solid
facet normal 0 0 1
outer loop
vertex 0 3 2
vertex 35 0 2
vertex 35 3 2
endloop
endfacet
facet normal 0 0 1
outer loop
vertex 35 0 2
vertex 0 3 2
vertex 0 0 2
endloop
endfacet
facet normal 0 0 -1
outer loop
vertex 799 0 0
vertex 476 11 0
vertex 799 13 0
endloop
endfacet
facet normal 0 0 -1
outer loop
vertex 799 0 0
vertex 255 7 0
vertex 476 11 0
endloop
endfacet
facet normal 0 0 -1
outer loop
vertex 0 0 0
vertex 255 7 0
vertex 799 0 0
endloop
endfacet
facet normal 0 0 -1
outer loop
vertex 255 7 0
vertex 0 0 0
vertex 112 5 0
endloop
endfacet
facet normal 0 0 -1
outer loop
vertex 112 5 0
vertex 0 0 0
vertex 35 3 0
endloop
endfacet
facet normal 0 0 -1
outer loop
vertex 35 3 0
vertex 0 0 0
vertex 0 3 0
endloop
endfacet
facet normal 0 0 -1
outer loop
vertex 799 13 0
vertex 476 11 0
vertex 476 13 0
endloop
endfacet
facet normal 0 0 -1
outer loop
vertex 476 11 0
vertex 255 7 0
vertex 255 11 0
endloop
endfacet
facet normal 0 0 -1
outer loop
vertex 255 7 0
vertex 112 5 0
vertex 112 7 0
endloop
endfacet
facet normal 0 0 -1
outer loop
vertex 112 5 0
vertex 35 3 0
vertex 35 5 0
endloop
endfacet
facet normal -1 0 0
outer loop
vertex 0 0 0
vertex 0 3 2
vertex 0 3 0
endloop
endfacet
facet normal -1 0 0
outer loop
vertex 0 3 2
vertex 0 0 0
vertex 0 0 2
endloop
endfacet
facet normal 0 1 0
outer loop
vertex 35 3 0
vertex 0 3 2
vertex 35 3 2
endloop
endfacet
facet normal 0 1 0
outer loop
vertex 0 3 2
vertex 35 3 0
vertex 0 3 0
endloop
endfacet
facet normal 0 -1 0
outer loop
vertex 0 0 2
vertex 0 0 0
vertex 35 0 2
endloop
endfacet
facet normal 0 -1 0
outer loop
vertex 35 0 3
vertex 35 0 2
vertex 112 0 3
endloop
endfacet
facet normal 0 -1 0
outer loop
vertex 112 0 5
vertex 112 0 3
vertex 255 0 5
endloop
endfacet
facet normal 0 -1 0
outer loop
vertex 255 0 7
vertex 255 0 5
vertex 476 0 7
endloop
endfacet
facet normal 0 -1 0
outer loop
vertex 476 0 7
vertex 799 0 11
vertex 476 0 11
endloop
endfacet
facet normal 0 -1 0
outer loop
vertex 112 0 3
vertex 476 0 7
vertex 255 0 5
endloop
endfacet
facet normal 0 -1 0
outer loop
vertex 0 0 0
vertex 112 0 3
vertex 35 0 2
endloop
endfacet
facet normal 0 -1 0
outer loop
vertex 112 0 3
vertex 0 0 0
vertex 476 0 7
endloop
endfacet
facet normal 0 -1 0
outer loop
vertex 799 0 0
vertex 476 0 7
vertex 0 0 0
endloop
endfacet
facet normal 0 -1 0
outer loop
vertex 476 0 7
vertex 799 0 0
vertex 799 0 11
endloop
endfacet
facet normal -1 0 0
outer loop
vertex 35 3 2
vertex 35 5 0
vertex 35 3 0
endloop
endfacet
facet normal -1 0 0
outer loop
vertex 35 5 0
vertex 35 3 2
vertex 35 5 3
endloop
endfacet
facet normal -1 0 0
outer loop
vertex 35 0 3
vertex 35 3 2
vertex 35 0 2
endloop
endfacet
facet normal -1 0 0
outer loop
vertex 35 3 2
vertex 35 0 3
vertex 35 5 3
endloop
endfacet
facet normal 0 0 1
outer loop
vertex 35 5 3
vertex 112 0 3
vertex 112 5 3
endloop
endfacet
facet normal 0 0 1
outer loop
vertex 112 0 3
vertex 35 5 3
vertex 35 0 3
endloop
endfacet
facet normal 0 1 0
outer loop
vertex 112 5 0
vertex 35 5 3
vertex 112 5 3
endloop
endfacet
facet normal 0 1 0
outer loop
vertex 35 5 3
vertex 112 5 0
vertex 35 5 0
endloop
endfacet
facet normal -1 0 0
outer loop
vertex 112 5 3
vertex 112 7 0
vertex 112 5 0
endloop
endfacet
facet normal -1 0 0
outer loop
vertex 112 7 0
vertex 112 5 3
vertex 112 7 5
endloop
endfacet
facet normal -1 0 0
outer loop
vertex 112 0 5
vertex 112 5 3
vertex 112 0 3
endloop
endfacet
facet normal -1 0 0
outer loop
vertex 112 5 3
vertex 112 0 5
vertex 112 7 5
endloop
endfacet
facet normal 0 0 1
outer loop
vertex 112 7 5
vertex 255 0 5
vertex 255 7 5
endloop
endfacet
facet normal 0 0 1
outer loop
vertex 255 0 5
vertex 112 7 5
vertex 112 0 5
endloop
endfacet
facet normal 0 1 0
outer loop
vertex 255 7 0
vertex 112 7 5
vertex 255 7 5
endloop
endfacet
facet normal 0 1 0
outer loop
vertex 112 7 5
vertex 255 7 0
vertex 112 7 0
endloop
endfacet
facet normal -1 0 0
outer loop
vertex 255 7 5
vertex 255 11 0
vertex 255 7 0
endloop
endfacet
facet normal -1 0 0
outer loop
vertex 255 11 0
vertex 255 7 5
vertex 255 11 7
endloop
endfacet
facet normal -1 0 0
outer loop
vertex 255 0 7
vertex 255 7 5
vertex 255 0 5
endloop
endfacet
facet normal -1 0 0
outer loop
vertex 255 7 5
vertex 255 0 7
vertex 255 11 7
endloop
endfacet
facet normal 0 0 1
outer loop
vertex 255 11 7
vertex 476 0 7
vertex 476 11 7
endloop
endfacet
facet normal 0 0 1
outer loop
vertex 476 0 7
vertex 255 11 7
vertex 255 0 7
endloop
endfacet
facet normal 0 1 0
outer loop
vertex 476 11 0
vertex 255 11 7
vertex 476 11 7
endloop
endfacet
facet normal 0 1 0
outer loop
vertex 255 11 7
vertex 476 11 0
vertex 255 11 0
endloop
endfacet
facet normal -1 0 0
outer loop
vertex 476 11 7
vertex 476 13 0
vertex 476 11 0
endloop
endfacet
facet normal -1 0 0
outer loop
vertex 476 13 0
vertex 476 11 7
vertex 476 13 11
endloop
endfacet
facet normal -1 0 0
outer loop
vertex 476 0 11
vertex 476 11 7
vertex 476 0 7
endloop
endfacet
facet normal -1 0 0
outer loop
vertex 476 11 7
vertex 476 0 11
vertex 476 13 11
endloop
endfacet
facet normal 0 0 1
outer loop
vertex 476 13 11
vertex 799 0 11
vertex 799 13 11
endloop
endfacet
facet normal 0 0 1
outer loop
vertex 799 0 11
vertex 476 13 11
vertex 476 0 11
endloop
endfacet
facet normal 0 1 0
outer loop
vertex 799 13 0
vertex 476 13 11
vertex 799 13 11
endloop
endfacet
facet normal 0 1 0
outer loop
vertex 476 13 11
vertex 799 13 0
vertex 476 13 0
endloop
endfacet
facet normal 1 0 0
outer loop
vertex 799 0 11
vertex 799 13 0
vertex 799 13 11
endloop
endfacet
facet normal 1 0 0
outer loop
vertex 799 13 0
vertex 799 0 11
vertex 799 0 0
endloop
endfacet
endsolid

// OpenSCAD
translate([2.5, 1.5, 1.0]) color([0.0896193188307074, 0.2927345609042453, 0.1508090604701401]) cube([5, 3, 2], center=true);
translate([7.5, 1.5, 1.0]) color([0.2361450829166024, 0.3558094886115547, 0.7354997154547138]) cube([5, 3, 2], center=true);
translate([12.5, 1.5, 1.0]) color([0.4047113607648444, 0.2698397547254259, 0.4923131536276696]) cube([5, 3, 2], center=true);
translate([17.5, 1.5, 1.0]) color([0.39259324978876053, 0.310764197486207, 0.900541657866744]) cube([5, 3, 2], center=true);
translate([22.5, 1.5, 1.0]) color([0.5504484509596044, 0.9773275109747672, 0.7729124093934382]) cube([5, 3, 2], center=true);
translate([27.5, 1.5, 1.0]) color([0.570499297619577, 0.26244658927686404, 0.6868436562888387]) cube([5, 3, 2], center=true);
translate([32.5, 1.5, 1.0]) color([0.45591771896977173, 0.7213877150417534, 0.40377880891106155]) cube([5, 3, 2], center=true);
translate([38.5, 2.5, 1.5]) color([0.49600503631794757, 0.02068376744575562, 0.739958502320053]) cube([7, 5, 3], center=true);
translate([45.5, 2.5, 1.5]) color([0.03427354435563068, 0.6807253858476396, 0.5820036955379622]) cube([7, 5, 3], center=true);
translate([52.5, 2.5, 1.5]) color([0.7759176114881267, 0.28977759923741564, 0.6861108151233298]) cube([7, 5, 3], center=true);
translate([59.5, 2.5, 1.5]) color([0.20709797563103816, 0.5292720013578311, 0.34028037925118015]) cube([7, 5, 3], center=true);
translate([66.5, 2.5, 1.5]) color([0.9784545513570129, 0.9718665573793185, 0.20896973547336006]) cube([7, 5, 3], center=true);
translate([73.5, 2.5, 1.5]) color([0.5660382358858294, 0.3294426858782725, 0.9685381870202809]) cube([7, 5, 3], center=true);
translate([80.5, 2.5, 1.5]) color([0.9245259481865659, 0.5861458530564896, 0.7200844551084937]) cube([7, 5, 3], center=true);
translate([87.5, 2.5, 1.5]) color([0.6813247567090696, 0.353355632443361, 0.91636156937516]) cube([7, 5, 3], center=true);
translate([94.5, 2.5, 1.5]) color([0.899453536816357, 0.33065846447807934, 0.7473949106043586]) cube([7, 5, 3], center=true);
translate([101.5, 2.5, 1.5]) color([0.009092126674448586, 0.8163591105584419, 0.5648693453979996]) cube([7, 5, 3], center=true);
translate([108.5, 2.5, 1.5]) color([0.9523067127509502, 0.3631930745481745, 0.6257130749033707]) cube([7, 5, 3], center=true);
translate([117.5, 3.5, 2.5]) color([0.3230024315033787, 0.7827853814039997, 0.6007029967830003]) cube([11, 7, 5], center=true);
translate([128.5, 3.5, 2.5]) color([0.9874710229786893, 0.0010127930964535237, 0.14075874215813544]) cube([11, 7, 5], center=true);
translate([139.5, 3.5, 2.5]) color([0.043601382090813434, 0.1258478488128345, 0.9293852970698306]) cube([11, 7, 5], center=true);
translate([150.5, 3.5, 2.5]) color([0.9486082995058949, 0.4804125346981437, 0.9466893945947962]) cube([11, 7, 5], center=true);
translate([161.5, 3.5, 2.5]) color([0.818387610188399, 0.7786177341461099, 0.747281950803196]) cube([11, 7, 5], center=true);
translate([172.5, 3.5, 2.5]) color([0.18765458516959888, 0.5488772611027803, 0.4238792306088448]) cube([11, 7, 5], center=true);
translate([183.5, 3.5, 2.5]) color([0.949788047597888, 0.17383353806681645, 0.16985884355967462]) cube([11, 7, 5], center=true);
translate([194.5, 3.5, 2.5]) color([0.6588617536380149, 0.15740178957348283, 0.11005367295186075]) cube([11, 7, 5], center=true);
translate([205.5, 3.5, 2.5]) color([0.5039231973300066, 0.796660971220008, 0.6050456716470326]) cube([11, 7, 5], center=true);
translate([216.5, 3.5, 2.5]) color([0.7547539728480395, 0.2657585316255522, 0.28496283302929337]) cube([11, 7, 5], center=true);
translate([227.5, 3.5, 2.5]) color([0.42870364173152453, 0.990847884265713, 0.7179182565245089]) cube([11, 7, 5], center=true);
translate([238.5, 3.5, 2.5]) color([0.9462539572878983, 0.537870455736408, 0.5545598515713968]) cube([11, 7, 5], center=true);
translate([249.5, 3.5, 2.5]) color([0.9900903354753839, 0.18998827565888077, 0.7825904371715813]) cube([11, 7, 5], center=true);
translate([261.5, 5.5, 3.5]) color([0.7915138240285756, 0.8447416276181308, 0.7500527092169327]) cube([13, 11, 7], center=true);
translate([274.5, 5.5, 3.5]) color([0.15533301818854706, 0.661127632121674, 0.9237031845862264]) cube([13, 11, 7], center=true);
translate([287.5, 5.5, 3.5]) color([0.5632851524959844, 0.3609415103802872, 0.9495201486078587]) cube([13, 11, 7], center=true);
translate([300.5, 5.5, 3.5]) color([0.5615986504586717, 0.41163639453549183, 0.6141334980612769]) cube([13, 11, 7], center=true);
translate([313.5, 5.5, 3.5]) color([0.8041250166314531, 0.22830209061365048, 0.01569204302297844]) cube([13, 11, 7], center=true);
translate([326.5, 5.5, 3.5]) color([0.5290948970731422, 0.9413574200758085, 0.6802579626031922]) cube([13, 11, 7], center=true);
translate([339.5, 5.5, 3.5]) color([0.6309080001300065, 0.6278151474899732, 0.4969897122617175]) cube([13, 11, 7], center=true);
translate([352.5, 5.5, 3.5]) color([0.7309192697350546, 0.2491944400337247, 0.891754263952968]) cube([13, 11, 7], center=true);
translate([365.5, 5.5, 3.5]) color([0.2744726552452267, 0.9449450132107339, 0.9264967100320902]) cube([13, 11, 7], center=true);
translate([378.5, 5.5, 3.5]) color([0.07792452404752792, 0.44817970124433604, 0.7440362849370825]) cube([13, 11, 7], center=true);
translate([391.5, 5.5, 3.5]) color([0.44965407150807035, 0.5088990248364155, 0.8068239376717178]) cube([13, 11, 7], center=true);
translate([404.5, 5.5, 3.5]) color([0.7049921609492721, 0.9580042227229432, 0.16448599428307875]) cube([13, 11, 7], center=true);
translate([417.5, 5.5, 3.5]) color([0.9235592861863212, 0.9279862525071727, 0.6347489386405218]) cube([13, 11, 7], center=true);
translate([430.5, 5.5, 3.5]) color([0.9403908272970672, 0.25268558738542024, 0.8817872834036474]) cube([13, 11, 7], center=true);
translate([443.5, 5.5, 3.5]) color([0.7734792929601902, 0.6096889997106941, 0.09062924464806255]) cube([13, 11, 7], center=true);
translate([456.5, 5.5, 3.5]) color([0.030134353730962182, 0.01096949549411852, 0.2505580574481764]) cube([13, 11, 7], center=true);
translate([469.5, 5.5, 3.5]) color([0.7623524099431817, 0.3866250323922331, 0.7754467251552132]) cube([13, 11, 7], center=true);
translate([484.5, 6.5, 5.5]) color([0.6256424909314248, 0.3892618991218443, 0.8801466287862422]) cube([17, 13, 11], center=true);
translate([501.5, 6.5, 5.5]) color([0.03841723935819574, 0.465312990207844, 0.8298523393928158]) cube([17, 13, 11], center=true);
translate([518.5, 6.5, 5.5]) color([0.12681348297309336, 0.7104875615116192, 0.32811584191028165]) cube([17, 13, 11], center=true);
translate([535.5, 6.5, 5.5]) color([0.02430127857694553, 0.4737249308893109, 0.521692738945335]) cube([17, 13, 11], center=true);
translate([552.5, 6.5, 5.5]) color([0.04158625067384558, 0.5659193535517807, 0.34743383795783944]) cube([17, 13, 11], center=true);
translate([569.5, 6.5, 5.5]) color([0.004493207256296983, 0.19077338067656535, 0.11081067227867492]) cube([17, 13, 11], center=true);
translate([586.5, 6.5, 5.5]) color([0.5406219547324049, 0.043120163042338455, 0.9281325700980793]) cube([17, 13, 11], center=true);
translate([603.5, 6.5, 5.5]) color([0.8450619723983726, 0.9452976437314561, 0.31480103278643345]) cube([17, 13, 11], center=true);
translate([620.5, 6.5, 5.5]) color([0.9052673885618943, 0.984312422520035, 0.7647314342526466]) cube([17, 13, 11], center=true);
translate([637.5, 6.5, 5.5]) color([0.2750826135755835, 0.6708893041471536, 0.5956631537339799]) cube([17, 13, 11], center=true);
translate([654.5, 6.5, 5.5]) color([0.40420330216444333, 0.3060978540144266, 0.059848190567730275]) cube([17, 13, 11], center=true);
translate([671.5, 6.5, 5.5]) color([0.12538247475645914, 0.13395615600511968, 0.48089286465431025]) cube([17, 13, 11], center=true);
translate([688.5, 6.5, 5.5]) color([0.6418933847268948, 0.7640684524444807, 0.046713759972221824]) cube([17, 13, 11], center=true);
translate([705.5, 6.5, 5.5]) color([0.8237598726124178, 0.04347122329095843, 0.5549468300580123]) cube([17, 13, 11], center=true);
translate([722.5, 6.5, 5.5]) color([0.7441478498080107, 0.631221371794228, 0.949678675683002]) cube([17, 13, 11], center=true);
translate([739.5, 6.5, 5.5]) color([0.3446983531128357, 0.5858833552375392, 0.08279906273431636]) cube([17, 13, 11], center=true);
translate([756.5, 6.5, 5.5]) color([0.5597965879322987, 0.8132988010762888, 0.20160451382548072]) cube([17, 13, 11], center=true);
translate([773.5, 6.5, 5.5]) color([0.26096450036718066, 0.7004056402196938, 0.25388196693606324]) cube([17, 13, 11], center=true);
translate([790.5, 6.5, 5.5]) color([0.25924547402140496, 0.9355152879393015, 0.9985430308431146]) cube([17, 13, 11], center=true);
